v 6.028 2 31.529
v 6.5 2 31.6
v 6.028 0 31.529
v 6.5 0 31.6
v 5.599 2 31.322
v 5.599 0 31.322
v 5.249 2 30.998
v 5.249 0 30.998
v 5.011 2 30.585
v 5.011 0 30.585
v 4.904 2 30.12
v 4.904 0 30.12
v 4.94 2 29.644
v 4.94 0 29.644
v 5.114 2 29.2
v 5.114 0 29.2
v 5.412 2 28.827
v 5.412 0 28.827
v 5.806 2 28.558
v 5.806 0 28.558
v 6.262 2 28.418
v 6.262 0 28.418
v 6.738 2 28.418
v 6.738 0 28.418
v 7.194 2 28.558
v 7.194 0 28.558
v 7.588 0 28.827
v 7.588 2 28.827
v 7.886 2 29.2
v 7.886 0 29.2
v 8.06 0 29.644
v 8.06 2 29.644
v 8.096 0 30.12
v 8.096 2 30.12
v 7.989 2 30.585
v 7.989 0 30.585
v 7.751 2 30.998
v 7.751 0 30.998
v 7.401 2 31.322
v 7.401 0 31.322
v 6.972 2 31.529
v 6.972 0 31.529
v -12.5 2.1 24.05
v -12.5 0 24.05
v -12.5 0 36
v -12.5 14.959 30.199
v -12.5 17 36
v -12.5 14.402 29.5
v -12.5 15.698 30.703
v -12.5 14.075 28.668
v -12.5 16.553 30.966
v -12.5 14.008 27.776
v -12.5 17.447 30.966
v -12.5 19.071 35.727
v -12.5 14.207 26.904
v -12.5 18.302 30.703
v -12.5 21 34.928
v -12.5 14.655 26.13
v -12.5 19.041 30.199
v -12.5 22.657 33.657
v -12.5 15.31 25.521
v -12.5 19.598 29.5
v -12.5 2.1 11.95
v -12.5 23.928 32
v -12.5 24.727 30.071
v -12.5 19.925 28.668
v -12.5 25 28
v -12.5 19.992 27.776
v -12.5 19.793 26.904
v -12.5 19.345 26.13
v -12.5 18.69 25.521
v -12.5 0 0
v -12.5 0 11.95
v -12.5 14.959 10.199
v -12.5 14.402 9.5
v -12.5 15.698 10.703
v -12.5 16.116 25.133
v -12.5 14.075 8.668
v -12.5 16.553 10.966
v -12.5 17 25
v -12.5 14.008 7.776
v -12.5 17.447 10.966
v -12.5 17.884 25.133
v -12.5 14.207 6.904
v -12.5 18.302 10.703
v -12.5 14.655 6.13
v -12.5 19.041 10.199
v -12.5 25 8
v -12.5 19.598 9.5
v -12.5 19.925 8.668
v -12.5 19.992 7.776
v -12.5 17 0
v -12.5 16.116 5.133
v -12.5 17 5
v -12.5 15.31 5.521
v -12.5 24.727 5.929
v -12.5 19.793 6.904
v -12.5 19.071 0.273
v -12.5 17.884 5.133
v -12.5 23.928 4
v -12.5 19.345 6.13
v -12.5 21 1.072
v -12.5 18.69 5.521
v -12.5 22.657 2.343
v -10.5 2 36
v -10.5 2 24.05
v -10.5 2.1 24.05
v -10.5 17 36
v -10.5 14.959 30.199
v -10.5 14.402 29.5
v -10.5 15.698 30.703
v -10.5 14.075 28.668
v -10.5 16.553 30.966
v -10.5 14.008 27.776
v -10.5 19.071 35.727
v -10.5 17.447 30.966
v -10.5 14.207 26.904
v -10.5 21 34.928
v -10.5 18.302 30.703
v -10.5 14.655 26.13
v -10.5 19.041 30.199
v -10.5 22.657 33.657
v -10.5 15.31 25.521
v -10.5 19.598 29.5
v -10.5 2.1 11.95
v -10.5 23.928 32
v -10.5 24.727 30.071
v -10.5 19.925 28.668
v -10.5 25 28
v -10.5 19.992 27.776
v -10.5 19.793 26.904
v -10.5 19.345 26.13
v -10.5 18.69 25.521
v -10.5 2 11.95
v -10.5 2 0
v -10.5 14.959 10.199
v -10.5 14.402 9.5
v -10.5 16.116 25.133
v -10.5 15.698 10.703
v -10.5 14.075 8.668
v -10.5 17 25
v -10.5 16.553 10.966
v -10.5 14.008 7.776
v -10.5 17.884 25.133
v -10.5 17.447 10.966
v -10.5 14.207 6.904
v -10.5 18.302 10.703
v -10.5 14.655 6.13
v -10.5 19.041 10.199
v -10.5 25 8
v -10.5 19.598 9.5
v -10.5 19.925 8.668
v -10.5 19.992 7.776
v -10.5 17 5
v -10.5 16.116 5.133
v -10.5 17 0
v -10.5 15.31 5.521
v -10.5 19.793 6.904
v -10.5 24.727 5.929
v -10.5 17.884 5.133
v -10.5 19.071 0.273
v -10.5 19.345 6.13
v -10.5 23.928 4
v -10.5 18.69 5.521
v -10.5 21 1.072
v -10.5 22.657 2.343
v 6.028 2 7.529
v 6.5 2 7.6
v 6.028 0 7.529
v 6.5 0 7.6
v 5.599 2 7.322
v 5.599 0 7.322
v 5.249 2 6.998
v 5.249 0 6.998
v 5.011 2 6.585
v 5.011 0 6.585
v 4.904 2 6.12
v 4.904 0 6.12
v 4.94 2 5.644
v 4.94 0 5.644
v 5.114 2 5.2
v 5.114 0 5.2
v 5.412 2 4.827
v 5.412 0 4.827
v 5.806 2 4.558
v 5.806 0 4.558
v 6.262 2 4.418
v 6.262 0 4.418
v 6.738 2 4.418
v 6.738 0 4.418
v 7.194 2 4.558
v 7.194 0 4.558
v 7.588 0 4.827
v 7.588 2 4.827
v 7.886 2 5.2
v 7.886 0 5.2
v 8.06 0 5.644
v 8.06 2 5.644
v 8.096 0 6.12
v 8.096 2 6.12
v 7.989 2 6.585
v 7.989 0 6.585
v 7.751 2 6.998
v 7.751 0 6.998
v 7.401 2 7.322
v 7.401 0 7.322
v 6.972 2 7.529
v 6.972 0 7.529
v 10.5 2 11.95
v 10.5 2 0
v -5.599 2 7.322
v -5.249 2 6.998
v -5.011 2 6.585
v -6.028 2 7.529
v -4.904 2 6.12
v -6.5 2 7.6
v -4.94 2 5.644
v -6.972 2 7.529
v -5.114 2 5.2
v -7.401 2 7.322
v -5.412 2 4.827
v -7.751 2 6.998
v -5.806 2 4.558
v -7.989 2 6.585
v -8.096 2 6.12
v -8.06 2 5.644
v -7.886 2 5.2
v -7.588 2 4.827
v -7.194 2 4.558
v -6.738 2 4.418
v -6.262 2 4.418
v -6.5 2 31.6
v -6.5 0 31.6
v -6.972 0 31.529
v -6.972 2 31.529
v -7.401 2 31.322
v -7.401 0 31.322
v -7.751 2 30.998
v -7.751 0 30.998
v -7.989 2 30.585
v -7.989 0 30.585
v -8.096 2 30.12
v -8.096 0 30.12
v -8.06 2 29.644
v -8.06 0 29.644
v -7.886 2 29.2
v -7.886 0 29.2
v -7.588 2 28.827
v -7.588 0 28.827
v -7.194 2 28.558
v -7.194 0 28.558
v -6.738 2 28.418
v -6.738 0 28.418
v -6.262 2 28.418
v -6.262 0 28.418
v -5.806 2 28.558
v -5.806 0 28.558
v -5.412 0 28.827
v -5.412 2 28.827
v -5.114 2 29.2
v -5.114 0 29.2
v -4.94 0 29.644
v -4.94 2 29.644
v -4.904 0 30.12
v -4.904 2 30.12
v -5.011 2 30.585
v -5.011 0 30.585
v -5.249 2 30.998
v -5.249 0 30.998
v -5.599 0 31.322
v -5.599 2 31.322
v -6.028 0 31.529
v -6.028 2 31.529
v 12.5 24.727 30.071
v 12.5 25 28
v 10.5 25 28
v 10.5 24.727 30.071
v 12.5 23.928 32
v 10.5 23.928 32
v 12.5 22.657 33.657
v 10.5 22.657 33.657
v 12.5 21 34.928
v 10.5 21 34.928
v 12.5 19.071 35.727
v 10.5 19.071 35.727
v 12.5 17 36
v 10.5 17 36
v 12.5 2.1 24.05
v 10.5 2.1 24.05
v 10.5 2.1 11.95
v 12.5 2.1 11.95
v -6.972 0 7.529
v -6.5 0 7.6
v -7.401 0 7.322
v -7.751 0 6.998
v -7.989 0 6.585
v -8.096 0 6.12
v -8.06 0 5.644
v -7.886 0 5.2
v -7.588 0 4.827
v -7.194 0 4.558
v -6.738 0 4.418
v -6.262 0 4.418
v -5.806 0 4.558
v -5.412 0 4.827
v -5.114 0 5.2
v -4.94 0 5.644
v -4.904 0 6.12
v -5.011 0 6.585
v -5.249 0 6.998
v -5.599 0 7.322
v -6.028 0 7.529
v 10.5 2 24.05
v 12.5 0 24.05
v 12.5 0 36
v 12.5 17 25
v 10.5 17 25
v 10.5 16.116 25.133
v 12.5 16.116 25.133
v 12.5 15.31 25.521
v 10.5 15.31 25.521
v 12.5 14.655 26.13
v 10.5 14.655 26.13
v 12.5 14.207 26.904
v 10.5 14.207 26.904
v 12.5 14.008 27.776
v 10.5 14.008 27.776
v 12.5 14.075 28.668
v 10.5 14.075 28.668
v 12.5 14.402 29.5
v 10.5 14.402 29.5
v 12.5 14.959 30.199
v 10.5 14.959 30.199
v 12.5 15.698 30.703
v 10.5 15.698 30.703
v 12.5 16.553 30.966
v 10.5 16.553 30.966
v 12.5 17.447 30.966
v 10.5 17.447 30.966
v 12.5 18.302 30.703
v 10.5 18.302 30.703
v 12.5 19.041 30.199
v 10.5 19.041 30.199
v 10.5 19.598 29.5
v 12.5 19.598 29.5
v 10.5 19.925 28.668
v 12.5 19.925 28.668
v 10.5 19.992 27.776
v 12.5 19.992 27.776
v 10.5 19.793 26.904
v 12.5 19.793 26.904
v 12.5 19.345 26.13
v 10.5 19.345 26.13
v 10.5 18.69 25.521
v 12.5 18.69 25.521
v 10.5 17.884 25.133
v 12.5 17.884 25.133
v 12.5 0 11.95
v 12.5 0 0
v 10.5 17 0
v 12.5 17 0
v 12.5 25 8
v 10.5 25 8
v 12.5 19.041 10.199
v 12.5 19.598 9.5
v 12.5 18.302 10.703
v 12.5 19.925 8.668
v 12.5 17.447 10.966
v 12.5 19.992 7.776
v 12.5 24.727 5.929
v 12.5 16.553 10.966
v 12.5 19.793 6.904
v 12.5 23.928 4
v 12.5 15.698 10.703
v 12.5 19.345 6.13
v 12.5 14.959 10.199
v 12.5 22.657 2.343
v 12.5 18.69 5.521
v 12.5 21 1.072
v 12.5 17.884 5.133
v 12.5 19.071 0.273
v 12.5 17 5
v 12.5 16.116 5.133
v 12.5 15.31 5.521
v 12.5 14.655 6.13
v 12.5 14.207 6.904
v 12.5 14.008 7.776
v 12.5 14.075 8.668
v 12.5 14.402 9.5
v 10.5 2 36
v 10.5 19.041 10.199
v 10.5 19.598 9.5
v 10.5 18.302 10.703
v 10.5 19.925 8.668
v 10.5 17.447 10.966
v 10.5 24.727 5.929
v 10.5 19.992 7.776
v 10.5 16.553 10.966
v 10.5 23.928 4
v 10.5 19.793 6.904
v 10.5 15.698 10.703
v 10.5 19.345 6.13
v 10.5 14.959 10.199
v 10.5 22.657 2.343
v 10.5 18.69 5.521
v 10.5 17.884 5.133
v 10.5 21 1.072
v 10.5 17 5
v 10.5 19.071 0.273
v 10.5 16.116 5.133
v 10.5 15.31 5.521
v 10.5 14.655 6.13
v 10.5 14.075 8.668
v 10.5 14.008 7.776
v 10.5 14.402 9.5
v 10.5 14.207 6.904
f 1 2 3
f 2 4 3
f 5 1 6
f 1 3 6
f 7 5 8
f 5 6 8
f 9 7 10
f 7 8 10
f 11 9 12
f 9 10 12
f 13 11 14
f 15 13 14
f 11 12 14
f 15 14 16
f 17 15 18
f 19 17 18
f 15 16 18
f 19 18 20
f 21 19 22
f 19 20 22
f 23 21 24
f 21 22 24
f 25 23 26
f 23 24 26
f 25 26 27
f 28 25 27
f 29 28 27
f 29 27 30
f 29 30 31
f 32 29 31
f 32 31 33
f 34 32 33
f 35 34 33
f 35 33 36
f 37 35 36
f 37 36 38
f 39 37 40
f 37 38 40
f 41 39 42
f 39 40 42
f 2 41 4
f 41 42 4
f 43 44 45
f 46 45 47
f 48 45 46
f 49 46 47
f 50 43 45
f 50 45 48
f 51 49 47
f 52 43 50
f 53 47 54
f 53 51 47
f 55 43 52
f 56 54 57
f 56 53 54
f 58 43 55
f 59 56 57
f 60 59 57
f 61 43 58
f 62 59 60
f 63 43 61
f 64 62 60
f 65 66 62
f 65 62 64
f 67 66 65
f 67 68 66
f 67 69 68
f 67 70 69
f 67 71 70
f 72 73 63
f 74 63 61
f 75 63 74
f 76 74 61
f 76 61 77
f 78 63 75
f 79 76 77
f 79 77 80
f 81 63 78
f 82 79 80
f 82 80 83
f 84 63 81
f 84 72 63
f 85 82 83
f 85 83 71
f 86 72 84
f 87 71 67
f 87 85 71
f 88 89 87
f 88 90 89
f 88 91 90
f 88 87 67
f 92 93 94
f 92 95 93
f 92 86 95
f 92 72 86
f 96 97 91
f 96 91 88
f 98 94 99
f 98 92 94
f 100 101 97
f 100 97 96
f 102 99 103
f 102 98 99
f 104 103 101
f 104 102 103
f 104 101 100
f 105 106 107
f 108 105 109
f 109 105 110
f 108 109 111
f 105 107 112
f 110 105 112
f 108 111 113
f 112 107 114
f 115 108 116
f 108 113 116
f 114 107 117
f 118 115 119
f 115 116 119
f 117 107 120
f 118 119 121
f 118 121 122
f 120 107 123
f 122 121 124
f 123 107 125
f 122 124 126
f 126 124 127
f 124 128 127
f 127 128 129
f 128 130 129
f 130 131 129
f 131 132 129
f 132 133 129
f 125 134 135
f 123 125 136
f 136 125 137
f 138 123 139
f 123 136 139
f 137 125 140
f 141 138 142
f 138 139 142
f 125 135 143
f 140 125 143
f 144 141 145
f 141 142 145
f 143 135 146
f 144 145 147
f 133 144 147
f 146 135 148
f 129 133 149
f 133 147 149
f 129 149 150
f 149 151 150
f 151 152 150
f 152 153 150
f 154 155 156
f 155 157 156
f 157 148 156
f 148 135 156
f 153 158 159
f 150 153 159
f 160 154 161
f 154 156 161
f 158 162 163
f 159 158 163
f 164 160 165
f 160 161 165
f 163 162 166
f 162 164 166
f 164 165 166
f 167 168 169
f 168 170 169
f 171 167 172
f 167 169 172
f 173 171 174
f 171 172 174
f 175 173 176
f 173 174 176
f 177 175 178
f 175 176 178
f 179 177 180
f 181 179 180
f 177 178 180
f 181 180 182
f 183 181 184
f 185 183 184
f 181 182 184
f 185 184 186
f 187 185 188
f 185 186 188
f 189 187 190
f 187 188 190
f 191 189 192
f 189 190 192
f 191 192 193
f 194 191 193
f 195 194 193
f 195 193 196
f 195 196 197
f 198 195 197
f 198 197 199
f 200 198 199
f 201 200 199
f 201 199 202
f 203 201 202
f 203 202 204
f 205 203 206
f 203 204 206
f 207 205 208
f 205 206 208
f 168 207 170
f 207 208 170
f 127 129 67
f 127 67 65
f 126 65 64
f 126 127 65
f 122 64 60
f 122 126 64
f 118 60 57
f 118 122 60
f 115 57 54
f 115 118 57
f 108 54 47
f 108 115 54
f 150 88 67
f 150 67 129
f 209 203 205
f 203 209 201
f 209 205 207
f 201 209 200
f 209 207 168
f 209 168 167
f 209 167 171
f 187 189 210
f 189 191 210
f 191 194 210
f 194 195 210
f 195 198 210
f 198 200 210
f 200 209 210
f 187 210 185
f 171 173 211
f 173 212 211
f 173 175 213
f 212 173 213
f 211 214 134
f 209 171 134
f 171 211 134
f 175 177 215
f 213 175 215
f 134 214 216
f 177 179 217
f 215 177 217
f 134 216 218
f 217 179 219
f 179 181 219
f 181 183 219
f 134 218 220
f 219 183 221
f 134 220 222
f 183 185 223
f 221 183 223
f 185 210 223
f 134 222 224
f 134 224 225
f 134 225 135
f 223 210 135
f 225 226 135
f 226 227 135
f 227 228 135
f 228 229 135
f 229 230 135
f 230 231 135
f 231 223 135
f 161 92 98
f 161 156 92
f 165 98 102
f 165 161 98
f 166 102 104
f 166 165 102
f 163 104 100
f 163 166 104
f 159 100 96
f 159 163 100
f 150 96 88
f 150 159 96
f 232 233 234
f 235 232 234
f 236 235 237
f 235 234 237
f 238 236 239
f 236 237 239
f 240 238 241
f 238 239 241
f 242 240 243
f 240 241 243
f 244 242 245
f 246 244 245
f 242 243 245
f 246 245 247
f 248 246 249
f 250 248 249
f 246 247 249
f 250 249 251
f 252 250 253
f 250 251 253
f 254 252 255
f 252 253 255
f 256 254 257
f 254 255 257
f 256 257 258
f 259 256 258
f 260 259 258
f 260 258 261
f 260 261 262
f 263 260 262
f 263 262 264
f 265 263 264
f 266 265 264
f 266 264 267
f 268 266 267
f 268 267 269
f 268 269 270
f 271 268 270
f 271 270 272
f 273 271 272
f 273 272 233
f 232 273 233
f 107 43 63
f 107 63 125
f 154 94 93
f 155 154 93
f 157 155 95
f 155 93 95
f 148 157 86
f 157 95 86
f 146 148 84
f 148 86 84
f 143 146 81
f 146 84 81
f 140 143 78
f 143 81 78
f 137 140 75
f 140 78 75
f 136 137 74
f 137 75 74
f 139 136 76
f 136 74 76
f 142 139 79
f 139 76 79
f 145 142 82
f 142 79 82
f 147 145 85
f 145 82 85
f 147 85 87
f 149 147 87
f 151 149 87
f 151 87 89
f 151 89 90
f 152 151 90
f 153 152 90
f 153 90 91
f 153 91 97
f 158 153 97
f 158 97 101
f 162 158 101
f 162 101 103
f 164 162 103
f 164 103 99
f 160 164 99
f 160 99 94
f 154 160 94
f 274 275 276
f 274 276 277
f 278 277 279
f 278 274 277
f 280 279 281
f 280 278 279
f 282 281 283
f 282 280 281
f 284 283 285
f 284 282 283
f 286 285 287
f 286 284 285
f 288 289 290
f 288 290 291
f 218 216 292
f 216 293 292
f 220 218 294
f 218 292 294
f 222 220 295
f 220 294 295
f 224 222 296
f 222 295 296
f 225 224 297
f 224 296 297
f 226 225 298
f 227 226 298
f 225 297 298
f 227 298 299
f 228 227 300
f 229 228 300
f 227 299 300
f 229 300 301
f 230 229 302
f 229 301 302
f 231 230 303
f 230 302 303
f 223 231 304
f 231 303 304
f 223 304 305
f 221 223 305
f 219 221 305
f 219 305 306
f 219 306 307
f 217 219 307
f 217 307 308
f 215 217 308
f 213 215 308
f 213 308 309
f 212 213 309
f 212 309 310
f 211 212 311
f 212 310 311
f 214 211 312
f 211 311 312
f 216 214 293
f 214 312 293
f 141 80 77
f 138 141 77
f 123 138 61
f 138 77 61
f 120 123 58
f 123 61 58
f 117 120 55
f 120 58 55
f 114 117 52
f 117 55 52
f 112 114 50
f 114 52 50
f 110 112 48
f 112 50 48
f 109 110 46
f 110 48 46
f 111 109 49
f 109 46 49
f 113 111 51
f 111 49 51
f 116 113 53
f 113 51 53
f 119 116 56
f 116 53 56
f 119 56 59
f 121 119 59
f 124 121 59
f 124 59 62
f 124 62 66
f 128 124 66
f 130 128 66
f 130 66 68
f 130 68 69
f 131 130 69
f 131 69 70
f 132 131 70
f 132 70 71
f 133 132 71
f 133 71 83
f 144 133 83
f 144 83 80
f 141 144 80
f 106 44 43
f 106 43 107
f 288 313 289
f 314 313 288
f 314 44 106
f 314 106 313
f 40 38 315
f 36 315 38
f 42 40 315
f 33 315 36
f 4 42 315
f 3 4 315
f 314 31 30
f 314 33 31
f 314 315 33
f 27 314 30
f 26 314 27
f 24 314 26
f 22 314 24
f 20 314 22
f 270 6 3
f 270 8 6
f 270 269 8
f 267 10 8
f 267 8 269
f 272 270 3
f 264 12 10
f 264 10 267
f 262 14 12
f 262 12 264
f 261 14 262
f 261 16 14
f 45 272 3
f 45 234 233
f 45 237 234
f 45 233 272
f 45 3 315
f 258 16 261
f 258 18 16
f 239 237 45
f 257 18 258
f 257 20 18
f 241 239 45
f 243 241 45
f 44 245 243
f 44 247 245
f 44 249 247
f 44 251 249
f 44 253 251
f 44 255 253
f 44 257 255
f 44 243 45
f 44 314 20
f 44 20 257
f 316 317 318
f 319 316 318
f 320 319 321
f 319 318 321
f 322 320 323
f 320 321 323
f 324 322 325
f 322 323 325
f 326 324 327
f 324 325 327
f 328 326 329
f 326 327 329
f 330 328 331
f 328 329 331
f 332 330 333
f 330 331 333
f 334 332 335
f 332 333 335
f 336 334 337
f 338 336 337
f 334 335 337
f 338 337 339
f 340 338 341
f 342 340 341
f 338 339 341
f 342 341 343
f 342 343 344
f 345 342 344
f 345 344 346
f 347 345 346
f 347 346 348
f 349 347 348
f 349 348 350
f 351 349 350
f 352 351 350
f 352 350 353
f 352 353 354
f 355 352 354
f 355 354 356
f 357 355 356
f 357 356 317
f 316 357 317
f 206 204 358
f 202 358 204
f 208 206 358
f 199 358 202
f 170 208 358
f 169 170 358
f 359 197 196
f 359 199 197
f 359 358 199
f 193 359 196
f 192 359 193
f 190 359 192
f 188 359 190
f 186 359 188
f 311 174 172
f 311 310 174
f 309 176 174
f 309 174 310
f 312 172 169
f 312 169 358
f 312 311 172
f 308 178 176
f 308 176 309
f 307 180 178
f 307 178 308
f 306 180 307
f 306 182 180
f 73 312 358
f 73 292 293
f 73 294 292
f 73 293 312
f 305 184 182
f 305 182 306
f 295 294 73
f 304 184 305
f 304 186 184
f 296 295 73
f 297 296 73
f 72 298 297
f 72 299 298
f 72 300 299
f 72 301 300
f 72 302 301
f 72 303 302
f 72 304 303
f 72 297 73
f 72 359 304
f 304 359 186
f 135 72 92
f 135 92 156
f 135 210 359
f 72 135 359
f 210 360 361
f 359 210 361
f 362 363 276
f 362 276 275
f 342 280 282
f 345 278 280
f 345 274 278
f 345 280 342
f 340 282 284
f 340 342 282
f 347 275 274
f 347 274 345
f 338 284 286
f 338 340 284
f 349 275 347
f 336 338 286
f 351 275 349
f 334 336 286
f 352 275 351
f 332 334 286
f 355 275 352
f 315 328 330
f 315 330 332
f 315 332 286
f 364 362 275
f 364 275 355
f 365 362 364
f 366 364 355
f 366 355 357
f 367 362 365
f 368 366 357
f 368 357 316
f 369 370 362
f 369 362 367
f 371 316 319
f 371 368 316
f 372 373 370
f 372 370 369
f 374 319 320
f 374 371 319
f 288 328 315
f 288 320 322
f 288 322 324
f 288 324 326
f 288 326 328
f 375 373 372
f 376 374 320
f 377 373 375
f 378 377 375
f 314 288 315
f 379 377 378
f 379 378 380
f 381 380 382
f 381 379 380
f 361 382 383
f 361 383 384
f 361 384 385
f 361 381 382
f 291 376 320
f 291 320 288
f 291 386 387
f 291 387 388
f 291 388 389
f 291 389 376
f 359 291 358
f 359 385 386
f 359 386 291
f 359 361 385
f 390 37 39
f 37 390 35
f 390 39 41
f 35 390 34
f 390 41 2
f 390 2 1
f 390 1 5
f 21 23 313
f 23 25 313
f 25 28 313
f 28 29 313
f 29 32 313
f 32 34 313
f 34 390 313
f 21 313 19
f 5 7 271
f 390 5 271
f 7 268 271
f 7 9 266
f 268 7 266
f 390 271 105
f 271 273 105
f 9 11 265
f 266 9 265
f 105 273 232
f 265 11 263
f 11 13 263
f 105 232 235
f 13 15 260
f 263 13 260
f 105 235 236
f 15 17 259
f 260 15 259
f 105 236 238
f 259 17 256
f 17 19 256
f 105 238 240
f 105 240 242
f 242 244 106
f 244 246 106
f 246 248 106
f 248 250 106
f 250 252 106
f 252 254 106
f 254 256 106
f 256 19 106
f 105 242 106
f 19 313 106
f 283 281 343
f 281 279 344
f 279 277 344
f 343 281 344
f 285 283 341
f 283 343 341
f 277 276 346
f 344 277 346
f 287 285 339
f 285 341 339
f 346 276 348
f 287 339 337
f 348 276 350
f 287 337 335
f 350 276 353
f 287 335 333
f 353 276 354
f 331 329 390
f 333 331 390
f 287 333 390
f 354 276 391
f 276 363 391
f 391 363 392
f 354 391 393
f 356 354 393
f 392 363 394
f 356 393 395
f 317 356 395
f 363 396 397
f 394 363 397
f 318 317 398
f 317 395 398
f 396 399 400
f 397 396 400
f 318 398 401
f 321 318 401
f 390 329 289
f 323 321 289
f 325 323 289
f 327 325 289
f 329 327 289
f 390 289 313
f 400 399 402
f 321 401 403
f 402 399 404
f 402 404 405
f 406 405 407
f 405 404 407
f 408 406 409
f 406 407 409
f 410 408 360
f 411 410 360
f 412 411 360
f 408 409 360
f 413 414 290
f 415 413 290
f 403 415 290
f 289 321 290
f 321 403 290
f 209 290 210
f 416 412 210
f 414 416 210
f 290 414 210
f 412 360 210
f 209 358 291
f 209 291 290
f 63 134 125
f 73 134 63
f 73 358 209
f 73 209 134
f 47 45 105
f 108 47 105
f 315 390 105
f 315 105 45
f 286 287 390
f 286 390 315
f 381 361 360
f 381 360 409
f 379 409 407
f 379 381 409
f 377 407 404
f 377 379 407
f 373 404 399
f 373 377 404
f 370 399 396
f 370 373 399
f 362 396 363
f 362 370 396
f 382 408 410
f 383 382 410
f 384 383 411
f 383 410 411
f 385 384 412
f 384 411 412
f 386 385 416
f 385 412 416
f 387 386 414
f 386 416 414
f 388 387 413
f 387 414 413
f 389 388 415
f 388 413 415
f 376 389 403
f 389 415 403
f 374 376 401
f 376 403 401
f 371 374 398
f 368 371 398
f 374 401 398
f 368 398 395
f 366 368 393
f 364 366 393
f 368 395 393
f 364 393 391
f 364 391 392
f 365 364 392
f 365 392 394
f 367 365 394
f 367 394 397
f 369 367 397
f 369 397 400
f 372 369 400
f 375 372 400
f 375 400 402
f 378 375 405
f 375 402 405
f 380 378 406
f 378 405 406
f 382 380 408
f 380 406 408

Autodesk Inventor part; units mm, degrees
ref_plane "YZ Plane" through (0, 0, 0) normal (1, 0, 0) x (0, 1, 0)
ref_plane "XZ Plane" through (0, 0, 0) normal (0, 1, 0) x (-1, 0, 0)
ref_plane "XY Plane" through (0, 0, 0) normal (0, 0, 1) x (1, 0, 0)
sketch "スケッチ1" plane through (0, 0, 0) normal (0, 0, 1) x (1, 0, 0)
  line L0 (-12.5, 25) -> (12.5, 25)
  line L1 (12.5, 25) -> (12.5, 0)
  line L2 (12.5, 0) -> (-12.5, 0)
  line L3 (-12.5, 0) -> (-12.5, 25)
  line L4 (-10.5, 25) -> (10.5, 25)
  line L5 (10.5, 25) -> (10.5, 2)
  line L6 (10.5, 2) -> (-10.5, 2)
  line L7 (-10.5, 2) -> (-10.5, 25)
  point P0 (0, 0)
  dimension "d0" = 25
  dimension "d1" = 25
  dimension "d2" = 0
  dimension "d3" = 12.5
  dimension "d4" = 2
  dimension "d5" = 2
  dimension "d6" = 2
extrude "押し出し1" add sketch "スケッチ1" along normal blind 36 contours L0 L7 L6 L5 L1 L2 L3
sketch "スケッチ2" plane through (12.5, 0, 0) normal (1, 0, 0) x (0, 0, -1)
  line L0 (-36, 25) -> (-36, 0) projected
  line L1 (0, 25) -> (-36, 25) projected
  point P0 (-28, 17)
  point P1 (-8, 17)
  dimension "d9" = 20
  dimension "d10" = 8
  dimension "d11" = 8
  dimension "d12" = 8
hole "Hole1" at (12.5, 17, 28) at (12.5, 17, 8) direction (-1, 0, 0) diameter 6 end through all
fillet "フィレット1" radius 8 4 edges at (11.5, 25, 36) (-11.5, 25, 36) (-11.5, 25, 0) (11.5, 25, 0)
sketch "スケッチ3" plane through (-10.5, 2, 36) normal (0, 1, 0) x (1, 0, 0)
  line L0 (21, 0) -> (0, 0) projected
  line L1 (21, 36) -> (21, 0) projected
  line L2 (0, 36) -> (21, 36) projected
  line L3 (0, 36) -> (0, 0) projected
  point P0 (10.5, 36)
  point P1 (4, 30)
  point P2 (17, 30)
  point P3 (17, 6)
  point P4 (4, 6)
  dimension "d21" = 6
  dimension "d22" = 4
  dimension "d23" = 6
  dimension "d24" = 4
  dimension "d25" = 4
  dimension "d26" = 6
  dimension "d27" = 6
  dimension "d28" = 4
hole "Hole2" at (-6.5, 2, 6) at (6.5, 2, 6) at (6.5, 2, 30) at (-6.5, 2, 30) direction (0, -1, 0) diameter 3.2 end through all
sketch "スケッチ4" plane through (-12.5, 0, 0) normal (0, -1, 0) x (1, 0, 0)
  line L0 (0, 0) -> (0, 36) projected
  line L1 (25, 0) -> (25, 36) projected
  line L2 (25, 18) -> (0, 18)
  line L3 (0, 24.05) -> (25, 24.05)
  line L4 (25, 24.05) -> (25, 11.95)
  line L5 (25, 11.95) -> (0, 11.95)
  line L6 (0, 11.95) -> (0, 24.05)
  point P0 (12.5, 0)
  dimension "d36" = 12.1
  dimension "d37" = 12.1
extrude "押し出し2" cut sketch "スケッチ4" against normal blind 2.1
equation "\"d1\" = d0"
equation "\"d3\" = 0.5 * d0"
equation "\"d5\" = d4"
equation "\"d6\" = d4"
equation "\"d10\" = d11"
equation "\"d12\" = d11"
equation "\"d23\" = d21"
equation "\"d24\" = d22"
equation "\"d25\" = d22"
equation "\"d26\" = d21"
equation "\"d27\" = d21"
equation "\"d28\" = d22"
equation "\"d37\" = d36"
properties part number "JointC3_2nd" material "アルミニウム 6061"
